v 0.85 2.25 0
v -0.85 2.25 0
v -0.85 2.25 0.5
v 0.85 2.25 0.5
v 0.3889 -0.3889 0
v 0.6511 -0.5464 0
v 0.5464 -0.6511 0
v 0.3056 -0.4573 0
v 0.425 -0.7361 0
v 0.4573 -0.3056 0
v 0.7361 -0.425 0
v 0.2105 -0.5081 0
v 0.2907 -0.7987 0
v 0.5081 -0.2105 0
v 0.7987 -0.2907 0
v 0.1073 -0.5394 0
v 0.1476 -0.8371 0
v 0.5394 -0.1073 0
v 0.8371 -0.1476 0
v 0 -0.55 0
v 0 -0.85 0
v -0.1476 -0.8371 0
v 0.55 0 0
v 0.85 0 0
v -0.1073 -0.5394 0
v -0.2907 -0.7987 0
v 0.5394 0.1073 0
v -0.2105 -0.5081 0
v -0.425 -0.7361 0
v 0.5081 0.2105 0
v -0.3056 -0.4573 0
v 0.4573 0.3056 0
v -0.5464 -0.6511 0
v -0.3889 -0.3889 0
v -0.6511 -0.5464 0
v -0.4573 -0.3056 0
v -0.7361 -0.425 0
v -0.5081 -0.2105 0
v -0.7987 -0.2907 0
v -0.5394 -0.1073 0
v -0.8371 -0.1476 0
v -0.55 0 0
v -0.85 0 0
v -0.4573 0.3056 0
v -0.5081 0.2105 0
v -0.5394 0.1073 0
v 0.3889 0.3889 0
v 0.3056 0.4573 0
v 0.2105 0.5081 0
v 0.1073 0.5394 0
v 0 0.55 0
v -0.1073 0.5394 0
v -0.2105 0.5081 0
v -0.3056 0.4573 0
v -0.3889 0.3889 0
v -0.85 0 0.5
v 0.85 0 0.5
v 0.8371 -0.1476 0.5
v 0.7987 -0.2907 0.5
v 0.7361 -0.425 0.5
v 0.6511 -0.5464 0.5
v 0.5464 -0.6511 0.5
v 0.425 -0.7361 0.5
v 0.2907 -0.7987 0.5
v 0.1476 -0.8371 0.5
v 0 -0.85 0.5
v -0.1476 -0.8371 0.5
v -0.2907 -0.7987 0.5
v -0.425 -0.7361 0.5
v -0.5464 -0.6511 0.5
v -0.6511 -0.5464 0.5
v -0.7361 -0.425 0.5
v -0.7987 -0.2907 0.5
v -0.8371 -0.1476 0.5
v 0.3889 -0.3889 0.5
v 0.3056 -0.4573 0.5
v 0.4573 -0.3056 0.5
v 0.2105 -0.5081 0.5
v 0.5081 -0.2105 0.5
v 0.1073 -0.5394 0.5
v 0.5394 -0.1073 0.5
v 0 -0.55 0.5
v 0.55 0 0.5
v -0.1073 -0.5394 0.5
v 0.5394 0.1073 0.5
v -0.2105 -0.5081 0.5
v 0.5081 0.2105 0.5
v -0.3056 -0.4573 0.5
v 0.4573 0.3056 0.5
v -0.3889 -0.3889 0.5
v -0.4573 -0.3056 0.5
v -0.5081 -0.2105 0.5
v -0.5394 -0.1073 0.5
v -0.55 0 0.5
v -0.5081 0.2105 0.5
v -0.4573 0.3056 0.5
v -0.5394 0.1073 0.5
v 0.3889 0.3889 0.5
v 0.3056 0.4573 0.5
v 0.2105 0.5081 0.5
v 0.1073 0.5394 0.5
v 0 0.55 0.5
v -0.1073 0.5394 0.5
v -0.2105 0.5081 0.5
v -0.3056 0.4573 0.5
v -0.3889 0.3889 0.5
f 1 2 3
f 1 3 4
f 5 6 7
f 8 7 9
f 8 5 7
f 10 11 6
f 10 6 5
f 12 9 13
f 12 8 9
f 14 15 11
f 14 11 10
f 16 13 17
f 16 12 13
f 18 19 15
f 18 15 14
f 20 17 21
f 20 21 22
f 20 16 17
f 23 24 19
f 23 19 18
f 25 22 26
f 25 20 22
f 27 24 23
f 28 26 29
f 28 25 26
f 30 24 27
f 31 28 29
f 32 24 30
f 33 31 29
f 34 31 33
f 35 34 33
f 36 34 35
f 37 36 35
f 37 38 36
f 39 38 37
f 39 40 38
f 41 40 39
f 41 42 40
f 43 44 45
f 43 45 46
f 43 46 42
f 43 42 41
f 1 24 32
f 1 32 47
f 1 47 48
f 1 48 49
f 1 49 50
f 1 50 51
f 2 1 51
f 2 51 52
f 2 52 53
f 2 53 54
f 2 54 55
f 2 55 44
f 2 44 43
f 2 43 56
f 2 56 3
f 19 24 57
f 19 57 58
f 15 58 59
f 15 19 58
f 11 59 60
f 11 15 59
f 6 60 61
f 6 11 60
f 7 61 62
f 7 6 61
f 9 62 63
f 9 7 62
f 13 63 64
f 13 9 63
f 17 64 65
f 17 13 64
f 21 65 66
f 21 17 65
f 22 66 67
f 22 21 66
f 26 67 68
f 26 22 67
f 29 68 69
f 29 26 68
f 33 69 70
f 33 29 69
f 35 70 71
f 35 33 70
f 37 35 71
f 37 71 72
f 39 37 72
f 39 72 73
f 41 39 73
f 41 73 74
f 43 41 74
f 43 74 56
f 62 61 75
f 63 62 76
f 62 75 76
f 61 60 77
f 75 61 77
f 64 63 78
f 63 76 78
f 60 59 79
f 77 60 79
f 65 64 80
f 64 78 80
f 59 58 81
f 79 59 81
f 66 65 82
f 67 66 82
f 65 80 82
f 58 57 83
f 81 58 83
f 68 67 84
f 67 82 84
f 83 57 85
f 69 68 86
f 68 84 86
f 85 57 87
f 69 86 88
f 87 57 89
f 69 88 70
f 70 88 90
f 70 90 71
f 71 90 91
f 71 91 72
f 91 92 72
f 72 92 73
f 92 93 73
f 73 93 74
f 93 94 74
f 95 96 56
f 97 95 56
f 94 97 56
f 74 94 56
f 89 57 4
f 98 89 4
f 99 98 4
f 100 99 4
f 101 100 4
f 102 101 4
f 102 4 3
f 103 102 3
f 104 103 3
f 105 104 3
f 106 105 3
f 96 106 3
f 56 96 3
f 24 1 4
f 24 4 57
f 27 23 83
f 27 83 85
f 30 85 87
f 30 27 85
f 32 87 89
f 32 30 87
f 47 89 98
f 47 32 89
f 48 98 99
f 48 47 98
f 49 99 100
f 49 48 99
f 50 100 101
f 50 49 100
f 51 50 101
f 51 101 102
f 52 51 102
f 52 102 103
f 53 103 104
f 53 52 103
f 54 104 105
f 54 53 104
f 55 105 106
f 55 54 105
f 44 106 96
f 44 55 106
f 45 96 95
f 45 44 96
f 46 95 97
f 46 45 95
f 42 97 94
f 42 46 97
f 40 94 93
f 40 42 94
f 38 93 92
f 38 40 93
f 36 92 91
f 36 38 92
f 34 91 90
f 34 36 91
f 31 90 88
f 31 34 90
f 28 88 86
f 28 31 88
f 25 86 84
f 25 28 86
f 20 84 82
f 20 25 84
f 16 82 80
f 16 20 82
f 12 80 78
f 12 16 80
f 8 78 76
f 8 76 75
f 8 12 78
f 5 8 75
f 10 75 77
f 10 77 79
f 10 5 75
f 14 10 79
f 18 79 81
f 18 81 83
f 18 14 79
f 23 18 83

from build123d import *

# Parameters (mm, degrees)
SKETCH2_R           = 0.55
BOSS_EXTRUDE1_DEPTH = 0.5


with BuildPart() as part:
    # Sketch2 → Boss-Extrude1 (new body)
    with BuildSketch(Plane.XY):
        with BuildLine():
            Line((-0.85, 2.25), (0.85, 2.25))
            Line((0.85, 2.25), (0.85, 0))
            ThreePointArc((0.85, 0), (0, -0.85), (-0.85, 0))
            Line((-0.85, 0), (-0.85, 2.25))
        make_face()
        Circle(SKETCH2_R, mode=Mode.SUBTRACT)
    extrude(amount=BOSS_EXTRUDE1_DEPTH)


solid = part.part
